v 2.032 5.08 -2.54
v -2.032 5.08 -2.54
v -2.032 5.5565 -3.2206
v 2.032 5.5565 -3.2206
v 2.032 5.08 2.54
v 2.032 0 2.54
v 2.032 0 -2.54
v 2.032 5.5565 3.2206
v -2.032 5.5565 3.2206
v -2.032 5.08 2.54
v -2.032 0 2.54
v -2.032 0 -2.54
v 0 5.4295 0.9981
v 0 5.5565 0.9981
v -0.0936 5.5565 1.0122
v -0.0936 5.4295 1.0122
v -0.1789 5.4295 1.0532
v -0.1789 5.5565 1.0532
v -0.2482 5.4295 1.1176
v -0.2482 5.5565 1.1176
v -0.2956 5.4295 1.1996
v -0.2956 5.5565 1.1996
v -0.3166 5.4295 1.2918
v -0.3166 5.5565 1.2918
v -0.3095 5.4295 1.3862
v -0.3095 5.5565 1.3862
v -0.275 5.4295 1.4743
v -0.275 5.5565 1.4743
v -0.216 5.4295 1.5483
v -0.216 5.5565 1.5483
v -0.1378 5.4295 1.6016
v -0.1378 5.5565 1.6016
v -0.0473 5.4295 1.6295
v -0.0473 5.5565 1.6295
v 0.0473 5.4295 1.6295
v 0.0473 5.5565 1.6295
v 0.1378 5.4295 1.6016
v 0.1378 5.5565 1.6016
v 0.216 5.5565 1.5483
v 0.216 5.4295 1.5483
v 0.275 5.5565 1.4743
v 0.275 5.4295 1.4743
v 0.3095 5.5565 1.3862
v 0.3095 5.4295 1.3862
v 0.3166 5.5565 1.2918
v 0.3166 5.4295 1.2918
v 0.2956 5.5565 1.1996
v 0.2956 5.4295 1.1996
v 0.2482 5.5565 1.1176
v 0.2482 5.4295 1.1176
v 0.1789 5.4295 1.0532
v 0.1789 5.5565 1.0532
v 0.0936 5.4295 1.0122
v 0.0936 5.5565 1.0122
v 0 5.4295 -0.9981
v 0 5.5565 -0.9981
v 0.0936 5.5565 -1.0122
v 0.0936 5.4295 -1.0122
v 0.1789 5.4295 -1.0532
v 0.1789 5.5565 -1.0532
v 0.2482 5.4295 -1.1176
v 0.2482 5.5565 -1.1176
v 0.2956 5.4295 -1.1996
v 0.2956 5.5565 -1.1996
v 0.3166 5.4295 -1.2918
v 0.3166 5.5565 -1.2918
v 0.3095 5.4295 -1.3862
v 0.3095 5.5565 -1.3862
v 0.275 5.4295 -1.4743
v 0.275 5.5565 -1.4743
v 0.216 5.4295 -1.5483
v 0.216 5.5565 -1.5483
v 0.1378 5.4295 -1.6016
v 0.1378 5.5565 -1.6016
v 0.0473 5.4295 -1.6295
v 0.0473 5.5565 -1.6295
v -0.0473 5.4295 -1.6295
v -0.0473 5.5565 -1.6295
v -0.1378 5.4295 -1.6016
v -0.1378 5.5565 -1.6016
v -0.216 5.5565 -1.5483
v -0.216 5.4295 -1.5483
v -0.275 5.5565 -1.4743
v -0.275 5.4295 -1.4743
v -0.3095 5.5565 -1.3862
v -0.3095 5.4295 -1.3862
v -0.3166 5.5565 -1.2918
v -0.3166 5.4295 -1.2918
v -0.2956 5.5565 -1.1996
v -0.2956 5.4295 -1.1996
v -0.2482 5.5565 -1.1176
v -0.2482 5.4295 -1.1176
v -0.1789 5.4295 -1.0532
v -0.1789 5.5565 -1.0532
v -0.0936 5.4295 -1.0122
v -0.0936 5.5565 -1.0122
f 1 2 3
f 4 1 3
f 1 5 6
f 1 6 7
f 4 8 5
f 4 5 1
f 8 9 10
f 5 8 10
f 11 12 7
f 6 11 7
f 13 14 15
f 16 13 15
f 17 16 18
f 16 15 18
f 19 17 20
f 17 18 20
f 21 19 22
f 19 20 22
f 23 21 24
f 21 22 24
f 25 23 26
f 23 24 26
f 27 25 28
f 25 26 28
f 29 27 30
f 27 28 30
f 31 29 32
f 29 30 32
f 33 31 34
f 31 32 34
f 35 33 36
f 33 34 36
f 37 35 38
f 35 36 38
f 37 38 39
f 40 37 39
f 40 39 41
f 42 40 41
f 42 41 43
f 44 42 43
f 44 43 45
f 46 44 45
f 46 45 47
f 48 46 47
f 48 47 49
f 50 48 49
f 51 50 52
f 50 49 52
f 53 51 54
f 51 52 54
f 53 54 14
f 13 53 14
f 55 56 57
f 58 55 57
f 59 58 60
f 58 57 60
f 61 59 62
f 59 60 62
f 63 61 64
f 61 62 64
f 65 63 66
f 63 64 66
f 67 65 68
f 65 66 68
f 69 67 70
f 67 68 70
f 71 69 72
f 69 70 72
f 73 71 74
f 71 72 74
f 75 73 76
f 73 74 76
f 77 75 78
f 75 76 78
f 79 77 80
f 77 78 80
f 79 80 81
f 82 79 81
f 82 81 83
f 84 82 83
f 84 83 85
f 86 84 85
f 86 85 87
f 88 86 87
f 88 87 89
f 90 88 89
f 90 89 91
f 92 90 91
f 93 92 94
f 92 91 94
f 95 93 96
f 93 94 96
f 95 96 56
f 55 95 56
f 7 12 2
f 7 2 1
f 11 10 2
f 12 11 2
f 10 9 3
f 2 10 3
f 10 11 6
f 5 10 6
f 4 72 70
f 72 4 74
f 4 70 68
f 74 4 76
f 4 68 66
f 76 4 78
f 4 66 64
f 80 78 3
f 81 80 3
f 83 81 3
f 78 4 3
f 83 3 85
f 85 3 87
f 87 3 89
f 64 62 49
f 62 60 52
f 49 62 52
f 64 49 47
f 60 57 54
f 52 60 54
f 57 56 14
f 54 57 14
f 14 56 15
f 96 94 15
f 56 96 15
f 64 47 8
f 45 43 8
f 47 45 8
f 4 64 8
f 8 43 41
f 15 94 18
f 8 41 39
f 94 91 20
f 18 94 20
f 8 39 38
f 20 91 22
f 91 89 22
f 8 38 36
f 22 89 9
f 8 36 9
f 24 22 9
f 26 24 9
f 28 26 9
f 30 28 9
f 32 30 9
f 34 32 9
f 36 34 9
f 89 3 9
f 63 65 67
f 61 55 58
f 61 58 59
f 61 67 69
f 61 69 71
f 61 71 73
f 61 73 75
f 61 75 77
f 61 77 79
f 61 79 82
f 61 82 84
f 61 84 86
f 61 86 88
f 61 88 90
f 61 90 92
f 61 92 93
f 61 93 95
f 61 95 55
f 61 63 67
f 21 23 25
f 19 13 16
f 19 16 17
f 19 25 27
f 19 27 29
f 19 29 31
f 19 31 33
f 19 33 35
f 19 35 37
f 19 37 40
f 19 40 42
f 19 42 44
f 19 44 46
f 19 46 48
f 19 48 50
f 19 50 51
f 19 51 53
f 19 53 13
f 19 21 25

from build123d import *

# Parameters (mm, degrees)
SKETCH1_W           = 4.064
SKETCH1_H           = 5.08
BOSS_EXTRUDE1_DEPTH = 5.08
BOSS_EXTRUDE3_DEPTH = 4.064
SKETCH5_R           = 0.3175
CUT_EXTRUDE2_DEPTH  = 0.127


with BuildPart() as part:
    # Sketch1 → Boss-Extrude1 (new body)
    with BuildSketch(Plane(origin=(0, 0, 0), x_dir=(1, 0, 0), z_dir=(0, 1, 0))):
        Rectangle(SKETCH1_W, SKETCH1_H)
    extrude(amount=BOSS_EXTRUDE1_DEPTH)

    # Sketch4 → Boss-Extrude3 (add)
    with BuildSketch(Plane.ZY.offset(2.032)):
        Polygon((-2.54, 5.08), (-3.220564847, 5.556536636), (3.220564847, 5.556536636), (2.54, 5.08), align=None)
    extrude(amount=-BOSS_EXTRUDE3_DEPTH)

    # Sketch5 → Cut-Extrude2 (cut)
    with BuildSketch(Plane(origin=(0, 5.556536636, 0), x_dir=(1, 0, 0), z_dir=(0, 1, 0))):
        with Locations(Location((0, 1.315564847, 0), (0, 0, 270))):
            Circle(SKETCH5_R)
        with Locations(Location((0, -1.315564847, 0), (0, 0, 90))):
            Circle(SKETCH5_R)
    extrude(amount=-CUT_EXTRUDE2_DEPTH, mode=Mode.SUBTRACT)


solid = part.part
